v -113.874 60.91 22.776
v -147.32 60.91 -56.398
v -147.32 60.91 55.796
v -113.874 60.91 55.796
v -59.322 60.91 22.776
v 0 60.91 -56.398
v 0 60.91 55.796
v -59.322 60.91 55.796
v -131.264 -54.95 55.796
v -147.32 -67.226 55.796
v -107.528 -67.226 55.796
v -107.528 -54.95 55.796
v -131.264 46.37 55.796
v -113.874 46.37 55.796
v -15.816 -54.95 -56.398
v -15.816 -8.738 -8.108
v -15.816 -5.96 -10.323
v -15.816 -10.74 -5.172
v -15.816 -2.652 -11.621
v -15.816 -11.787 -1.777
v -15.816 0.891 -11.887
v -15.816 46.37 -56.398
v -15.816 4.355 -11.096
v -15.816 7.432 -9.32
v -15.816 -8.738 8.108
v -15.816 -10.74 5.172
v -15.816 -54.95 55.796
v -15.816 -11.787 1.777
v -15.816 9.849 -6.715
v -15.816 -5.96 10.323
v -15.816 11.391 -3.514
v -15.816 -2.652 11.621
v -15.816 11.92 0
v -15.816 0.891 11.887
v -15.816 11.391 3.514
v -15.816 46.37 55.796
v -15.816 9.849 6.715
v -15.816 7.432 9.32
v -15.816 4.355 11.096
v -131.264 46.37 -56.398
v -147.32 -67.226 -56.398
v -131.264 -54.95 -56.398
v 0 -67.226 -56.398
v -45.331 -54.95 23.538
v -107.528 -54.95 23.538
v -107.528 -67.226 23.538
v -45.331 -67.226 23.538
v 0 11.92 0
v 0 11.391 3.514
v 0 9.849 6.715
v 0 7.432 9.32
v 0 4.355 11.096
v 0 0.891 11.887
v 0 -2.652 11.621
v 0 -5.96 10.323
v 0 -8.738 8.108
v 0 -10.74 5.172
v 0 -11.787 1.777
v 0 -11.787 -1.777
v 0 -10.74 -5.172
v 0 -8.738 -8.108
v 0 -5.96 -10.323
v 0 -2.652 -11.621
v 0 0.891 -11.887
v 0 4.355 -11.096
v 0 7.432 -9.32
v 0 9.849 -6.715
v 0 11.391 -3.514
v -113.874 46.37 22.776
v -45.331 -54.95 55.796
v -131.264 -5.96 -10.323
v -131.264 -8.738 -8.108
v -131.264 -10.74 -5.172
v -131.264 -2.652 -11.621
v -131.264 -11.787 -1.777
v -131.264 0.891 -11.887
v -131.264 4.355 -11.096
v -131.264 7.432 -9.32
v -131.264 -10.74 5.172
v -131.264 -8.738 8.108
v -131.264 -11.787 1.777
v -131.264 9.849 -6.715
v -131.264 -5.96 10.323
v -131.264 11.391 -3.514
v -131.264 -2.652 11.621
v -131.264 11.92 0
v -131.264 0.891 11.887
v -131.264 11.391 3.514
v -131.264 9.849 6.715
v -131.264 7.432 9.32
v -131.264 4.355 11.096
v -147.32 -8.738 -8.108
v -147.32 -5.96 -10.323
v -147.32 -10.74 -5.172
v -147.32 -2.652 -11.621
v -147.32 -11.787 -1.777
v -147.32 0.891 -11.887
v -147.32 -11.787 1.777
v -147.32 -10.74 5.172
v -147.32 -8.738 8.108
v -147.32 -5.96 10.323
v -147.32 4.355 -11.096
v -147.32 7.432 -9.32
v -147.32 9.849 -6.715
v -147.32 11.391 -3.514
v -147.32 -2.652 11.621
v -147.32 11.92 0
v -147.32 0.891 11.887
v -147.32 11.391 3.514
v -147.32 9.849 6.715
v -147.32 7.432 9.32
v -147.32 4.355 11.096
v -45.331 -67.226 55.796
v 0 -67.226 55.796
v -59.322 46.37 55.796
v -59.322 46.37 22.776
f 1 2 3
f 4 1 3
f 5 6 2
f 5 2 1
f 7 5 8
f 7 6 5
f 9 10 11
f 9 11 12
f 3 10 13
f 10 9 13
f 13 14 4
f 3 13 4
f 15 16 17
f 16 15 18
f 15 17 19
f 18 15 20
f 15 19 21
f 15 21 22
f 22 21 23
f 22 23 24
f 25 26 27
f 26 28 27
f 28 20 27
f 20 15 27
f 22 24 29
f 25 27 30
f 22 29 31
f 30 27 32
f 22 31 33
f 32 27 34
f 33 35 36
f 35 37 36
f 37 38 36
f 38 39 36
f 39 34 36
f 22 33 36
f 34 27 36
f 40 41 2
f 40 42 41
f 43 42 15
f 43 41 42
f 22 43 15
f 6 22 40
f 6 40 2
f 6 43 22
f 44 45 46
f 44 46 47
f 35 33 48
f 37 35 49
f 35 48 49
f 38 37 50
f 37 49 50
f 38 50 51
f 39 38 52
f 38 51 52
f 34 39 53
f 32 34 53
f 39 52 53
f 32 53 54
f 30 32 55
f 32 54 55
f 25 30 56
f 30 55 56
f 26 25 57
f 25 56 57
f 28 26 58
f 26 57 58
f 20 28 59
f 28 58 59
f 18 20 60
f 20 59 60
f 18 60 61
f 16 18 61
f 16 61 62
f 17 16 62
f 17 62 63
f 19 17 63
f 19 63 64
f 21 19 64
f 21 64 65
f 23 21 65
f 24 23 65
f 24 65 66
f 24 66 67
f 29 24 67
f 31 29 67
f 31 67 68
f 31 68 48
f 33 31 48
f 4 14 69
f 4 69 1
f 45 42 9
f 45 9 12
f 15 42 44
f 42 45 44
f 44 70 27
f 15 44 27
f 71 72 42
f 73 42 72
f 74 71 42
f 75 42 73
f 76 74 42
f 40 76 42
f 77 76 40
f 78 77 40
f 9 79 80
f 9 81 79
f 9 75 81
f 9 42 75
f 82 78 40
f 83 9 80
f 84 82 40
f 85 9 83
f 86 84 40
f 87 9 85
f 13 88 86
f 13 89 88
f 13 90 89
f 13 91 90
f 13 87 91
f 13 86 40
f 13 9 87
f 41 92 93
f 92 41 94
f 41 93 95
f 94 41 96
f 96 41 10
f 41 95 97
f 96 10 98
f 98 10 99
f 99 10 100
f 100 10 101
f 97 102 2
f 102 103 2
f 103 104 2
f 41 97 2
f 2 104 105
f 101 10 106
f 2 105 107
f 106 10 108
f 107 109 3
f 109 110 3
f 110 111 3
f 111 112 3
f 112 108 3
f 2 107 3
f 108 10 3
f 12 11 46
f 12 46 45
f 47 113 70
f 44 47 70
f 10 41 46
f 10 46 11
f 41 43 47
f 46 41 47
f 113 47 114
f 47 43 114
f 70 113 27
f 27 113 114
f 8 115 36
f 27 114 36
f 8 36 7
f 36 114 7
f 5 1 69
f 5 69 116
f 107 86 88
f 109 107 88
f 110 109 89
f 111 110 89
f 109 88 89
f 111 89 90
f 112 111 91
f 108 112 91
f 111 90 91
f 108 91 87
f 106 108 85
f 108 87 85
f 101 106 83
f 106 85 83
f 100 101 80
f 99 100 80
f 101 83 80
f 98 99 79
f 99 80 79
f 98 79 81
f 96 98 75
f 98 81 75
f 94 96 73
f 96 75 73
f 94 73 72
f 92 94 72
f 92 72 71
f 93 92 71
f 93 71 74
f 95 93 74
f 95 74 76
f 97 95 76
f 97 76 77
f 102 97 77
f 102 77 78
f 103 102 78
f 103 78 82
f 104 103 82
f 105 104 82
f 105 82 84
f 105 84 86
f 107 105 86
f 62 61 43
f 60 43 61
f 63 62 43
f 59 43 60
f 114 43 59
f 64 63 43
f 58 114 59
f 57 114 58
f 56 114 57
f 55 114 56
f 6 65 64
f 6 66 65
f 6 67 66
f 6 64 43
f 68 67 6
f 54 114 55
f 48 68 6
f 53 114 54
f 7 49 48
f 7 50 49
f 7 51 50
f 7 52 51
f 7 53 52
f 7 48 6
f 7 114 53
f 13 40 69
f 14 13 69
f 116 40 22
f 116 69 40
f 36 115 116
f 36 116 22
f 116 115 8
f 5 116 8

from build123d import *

# Parameters (mm, degrees)
F0_W     = 128.136318177
F0_H     = 112.1944747865
F0_R     = 11.9201465669
F1_DEPTH = 147.32
F2_W     = 115.4472436756
F2_H     = 101.3208404183
F3_DEPTH = 112.1954747865
F4_W     = 62.1966458857
F4_H     = 12.2760348022
F5_DEPTH = 32.258
F4_W_2   = 54.5518137515
F4_H_2   = 14.5394429564
F6_DEPTH = 33.02


with BuildPart() as f1:
    # F0 (on Right) → F1 (new body)
    with BuildSketch(Plane.YZ):
        with Locations((-3.1582880765, -0.3007892519)):
            Rectangle(F0_W, F0_H)
        Circle(F0_R, mode=Mode.SUBTRACT)
    extrude(amount=-F1_DEPTH)

    # F2 (on face) → F3 (cut, through all)
    with BuildSketch(Plane.XY.offset(55.7964481413)):
        with Locations((-73.5399918631, -4.2899921536)):
            Rectangle(F2_W, F2_H)
    extrude(amount=-F3_DEPTH, mode=Mode.SUBTRACT)

    # F4 (on face) → F5 (cut)
    with BuildSketch(Plane.XY.offset(55.7964481413)):
        with Locations((-76.4297451824, -61.0884297639)):
            Rectangle(F4_W, F4_H)
    extrude(amount=-F5_DEPTH, mode=Mode.SUBTRACT)

    # F4 (on face) → F6 (cut)
    with BuildSketch(Plane.XY.offset(55.7964481413)):
        with Locations((-86.5978654474, 53.6401495337)):
            Rectangle(F4_W_2, F4_H_2)
    extrude(amount=-F6_DEPTH, mode=Mode.SUBTRACT)


solid = f1.part
